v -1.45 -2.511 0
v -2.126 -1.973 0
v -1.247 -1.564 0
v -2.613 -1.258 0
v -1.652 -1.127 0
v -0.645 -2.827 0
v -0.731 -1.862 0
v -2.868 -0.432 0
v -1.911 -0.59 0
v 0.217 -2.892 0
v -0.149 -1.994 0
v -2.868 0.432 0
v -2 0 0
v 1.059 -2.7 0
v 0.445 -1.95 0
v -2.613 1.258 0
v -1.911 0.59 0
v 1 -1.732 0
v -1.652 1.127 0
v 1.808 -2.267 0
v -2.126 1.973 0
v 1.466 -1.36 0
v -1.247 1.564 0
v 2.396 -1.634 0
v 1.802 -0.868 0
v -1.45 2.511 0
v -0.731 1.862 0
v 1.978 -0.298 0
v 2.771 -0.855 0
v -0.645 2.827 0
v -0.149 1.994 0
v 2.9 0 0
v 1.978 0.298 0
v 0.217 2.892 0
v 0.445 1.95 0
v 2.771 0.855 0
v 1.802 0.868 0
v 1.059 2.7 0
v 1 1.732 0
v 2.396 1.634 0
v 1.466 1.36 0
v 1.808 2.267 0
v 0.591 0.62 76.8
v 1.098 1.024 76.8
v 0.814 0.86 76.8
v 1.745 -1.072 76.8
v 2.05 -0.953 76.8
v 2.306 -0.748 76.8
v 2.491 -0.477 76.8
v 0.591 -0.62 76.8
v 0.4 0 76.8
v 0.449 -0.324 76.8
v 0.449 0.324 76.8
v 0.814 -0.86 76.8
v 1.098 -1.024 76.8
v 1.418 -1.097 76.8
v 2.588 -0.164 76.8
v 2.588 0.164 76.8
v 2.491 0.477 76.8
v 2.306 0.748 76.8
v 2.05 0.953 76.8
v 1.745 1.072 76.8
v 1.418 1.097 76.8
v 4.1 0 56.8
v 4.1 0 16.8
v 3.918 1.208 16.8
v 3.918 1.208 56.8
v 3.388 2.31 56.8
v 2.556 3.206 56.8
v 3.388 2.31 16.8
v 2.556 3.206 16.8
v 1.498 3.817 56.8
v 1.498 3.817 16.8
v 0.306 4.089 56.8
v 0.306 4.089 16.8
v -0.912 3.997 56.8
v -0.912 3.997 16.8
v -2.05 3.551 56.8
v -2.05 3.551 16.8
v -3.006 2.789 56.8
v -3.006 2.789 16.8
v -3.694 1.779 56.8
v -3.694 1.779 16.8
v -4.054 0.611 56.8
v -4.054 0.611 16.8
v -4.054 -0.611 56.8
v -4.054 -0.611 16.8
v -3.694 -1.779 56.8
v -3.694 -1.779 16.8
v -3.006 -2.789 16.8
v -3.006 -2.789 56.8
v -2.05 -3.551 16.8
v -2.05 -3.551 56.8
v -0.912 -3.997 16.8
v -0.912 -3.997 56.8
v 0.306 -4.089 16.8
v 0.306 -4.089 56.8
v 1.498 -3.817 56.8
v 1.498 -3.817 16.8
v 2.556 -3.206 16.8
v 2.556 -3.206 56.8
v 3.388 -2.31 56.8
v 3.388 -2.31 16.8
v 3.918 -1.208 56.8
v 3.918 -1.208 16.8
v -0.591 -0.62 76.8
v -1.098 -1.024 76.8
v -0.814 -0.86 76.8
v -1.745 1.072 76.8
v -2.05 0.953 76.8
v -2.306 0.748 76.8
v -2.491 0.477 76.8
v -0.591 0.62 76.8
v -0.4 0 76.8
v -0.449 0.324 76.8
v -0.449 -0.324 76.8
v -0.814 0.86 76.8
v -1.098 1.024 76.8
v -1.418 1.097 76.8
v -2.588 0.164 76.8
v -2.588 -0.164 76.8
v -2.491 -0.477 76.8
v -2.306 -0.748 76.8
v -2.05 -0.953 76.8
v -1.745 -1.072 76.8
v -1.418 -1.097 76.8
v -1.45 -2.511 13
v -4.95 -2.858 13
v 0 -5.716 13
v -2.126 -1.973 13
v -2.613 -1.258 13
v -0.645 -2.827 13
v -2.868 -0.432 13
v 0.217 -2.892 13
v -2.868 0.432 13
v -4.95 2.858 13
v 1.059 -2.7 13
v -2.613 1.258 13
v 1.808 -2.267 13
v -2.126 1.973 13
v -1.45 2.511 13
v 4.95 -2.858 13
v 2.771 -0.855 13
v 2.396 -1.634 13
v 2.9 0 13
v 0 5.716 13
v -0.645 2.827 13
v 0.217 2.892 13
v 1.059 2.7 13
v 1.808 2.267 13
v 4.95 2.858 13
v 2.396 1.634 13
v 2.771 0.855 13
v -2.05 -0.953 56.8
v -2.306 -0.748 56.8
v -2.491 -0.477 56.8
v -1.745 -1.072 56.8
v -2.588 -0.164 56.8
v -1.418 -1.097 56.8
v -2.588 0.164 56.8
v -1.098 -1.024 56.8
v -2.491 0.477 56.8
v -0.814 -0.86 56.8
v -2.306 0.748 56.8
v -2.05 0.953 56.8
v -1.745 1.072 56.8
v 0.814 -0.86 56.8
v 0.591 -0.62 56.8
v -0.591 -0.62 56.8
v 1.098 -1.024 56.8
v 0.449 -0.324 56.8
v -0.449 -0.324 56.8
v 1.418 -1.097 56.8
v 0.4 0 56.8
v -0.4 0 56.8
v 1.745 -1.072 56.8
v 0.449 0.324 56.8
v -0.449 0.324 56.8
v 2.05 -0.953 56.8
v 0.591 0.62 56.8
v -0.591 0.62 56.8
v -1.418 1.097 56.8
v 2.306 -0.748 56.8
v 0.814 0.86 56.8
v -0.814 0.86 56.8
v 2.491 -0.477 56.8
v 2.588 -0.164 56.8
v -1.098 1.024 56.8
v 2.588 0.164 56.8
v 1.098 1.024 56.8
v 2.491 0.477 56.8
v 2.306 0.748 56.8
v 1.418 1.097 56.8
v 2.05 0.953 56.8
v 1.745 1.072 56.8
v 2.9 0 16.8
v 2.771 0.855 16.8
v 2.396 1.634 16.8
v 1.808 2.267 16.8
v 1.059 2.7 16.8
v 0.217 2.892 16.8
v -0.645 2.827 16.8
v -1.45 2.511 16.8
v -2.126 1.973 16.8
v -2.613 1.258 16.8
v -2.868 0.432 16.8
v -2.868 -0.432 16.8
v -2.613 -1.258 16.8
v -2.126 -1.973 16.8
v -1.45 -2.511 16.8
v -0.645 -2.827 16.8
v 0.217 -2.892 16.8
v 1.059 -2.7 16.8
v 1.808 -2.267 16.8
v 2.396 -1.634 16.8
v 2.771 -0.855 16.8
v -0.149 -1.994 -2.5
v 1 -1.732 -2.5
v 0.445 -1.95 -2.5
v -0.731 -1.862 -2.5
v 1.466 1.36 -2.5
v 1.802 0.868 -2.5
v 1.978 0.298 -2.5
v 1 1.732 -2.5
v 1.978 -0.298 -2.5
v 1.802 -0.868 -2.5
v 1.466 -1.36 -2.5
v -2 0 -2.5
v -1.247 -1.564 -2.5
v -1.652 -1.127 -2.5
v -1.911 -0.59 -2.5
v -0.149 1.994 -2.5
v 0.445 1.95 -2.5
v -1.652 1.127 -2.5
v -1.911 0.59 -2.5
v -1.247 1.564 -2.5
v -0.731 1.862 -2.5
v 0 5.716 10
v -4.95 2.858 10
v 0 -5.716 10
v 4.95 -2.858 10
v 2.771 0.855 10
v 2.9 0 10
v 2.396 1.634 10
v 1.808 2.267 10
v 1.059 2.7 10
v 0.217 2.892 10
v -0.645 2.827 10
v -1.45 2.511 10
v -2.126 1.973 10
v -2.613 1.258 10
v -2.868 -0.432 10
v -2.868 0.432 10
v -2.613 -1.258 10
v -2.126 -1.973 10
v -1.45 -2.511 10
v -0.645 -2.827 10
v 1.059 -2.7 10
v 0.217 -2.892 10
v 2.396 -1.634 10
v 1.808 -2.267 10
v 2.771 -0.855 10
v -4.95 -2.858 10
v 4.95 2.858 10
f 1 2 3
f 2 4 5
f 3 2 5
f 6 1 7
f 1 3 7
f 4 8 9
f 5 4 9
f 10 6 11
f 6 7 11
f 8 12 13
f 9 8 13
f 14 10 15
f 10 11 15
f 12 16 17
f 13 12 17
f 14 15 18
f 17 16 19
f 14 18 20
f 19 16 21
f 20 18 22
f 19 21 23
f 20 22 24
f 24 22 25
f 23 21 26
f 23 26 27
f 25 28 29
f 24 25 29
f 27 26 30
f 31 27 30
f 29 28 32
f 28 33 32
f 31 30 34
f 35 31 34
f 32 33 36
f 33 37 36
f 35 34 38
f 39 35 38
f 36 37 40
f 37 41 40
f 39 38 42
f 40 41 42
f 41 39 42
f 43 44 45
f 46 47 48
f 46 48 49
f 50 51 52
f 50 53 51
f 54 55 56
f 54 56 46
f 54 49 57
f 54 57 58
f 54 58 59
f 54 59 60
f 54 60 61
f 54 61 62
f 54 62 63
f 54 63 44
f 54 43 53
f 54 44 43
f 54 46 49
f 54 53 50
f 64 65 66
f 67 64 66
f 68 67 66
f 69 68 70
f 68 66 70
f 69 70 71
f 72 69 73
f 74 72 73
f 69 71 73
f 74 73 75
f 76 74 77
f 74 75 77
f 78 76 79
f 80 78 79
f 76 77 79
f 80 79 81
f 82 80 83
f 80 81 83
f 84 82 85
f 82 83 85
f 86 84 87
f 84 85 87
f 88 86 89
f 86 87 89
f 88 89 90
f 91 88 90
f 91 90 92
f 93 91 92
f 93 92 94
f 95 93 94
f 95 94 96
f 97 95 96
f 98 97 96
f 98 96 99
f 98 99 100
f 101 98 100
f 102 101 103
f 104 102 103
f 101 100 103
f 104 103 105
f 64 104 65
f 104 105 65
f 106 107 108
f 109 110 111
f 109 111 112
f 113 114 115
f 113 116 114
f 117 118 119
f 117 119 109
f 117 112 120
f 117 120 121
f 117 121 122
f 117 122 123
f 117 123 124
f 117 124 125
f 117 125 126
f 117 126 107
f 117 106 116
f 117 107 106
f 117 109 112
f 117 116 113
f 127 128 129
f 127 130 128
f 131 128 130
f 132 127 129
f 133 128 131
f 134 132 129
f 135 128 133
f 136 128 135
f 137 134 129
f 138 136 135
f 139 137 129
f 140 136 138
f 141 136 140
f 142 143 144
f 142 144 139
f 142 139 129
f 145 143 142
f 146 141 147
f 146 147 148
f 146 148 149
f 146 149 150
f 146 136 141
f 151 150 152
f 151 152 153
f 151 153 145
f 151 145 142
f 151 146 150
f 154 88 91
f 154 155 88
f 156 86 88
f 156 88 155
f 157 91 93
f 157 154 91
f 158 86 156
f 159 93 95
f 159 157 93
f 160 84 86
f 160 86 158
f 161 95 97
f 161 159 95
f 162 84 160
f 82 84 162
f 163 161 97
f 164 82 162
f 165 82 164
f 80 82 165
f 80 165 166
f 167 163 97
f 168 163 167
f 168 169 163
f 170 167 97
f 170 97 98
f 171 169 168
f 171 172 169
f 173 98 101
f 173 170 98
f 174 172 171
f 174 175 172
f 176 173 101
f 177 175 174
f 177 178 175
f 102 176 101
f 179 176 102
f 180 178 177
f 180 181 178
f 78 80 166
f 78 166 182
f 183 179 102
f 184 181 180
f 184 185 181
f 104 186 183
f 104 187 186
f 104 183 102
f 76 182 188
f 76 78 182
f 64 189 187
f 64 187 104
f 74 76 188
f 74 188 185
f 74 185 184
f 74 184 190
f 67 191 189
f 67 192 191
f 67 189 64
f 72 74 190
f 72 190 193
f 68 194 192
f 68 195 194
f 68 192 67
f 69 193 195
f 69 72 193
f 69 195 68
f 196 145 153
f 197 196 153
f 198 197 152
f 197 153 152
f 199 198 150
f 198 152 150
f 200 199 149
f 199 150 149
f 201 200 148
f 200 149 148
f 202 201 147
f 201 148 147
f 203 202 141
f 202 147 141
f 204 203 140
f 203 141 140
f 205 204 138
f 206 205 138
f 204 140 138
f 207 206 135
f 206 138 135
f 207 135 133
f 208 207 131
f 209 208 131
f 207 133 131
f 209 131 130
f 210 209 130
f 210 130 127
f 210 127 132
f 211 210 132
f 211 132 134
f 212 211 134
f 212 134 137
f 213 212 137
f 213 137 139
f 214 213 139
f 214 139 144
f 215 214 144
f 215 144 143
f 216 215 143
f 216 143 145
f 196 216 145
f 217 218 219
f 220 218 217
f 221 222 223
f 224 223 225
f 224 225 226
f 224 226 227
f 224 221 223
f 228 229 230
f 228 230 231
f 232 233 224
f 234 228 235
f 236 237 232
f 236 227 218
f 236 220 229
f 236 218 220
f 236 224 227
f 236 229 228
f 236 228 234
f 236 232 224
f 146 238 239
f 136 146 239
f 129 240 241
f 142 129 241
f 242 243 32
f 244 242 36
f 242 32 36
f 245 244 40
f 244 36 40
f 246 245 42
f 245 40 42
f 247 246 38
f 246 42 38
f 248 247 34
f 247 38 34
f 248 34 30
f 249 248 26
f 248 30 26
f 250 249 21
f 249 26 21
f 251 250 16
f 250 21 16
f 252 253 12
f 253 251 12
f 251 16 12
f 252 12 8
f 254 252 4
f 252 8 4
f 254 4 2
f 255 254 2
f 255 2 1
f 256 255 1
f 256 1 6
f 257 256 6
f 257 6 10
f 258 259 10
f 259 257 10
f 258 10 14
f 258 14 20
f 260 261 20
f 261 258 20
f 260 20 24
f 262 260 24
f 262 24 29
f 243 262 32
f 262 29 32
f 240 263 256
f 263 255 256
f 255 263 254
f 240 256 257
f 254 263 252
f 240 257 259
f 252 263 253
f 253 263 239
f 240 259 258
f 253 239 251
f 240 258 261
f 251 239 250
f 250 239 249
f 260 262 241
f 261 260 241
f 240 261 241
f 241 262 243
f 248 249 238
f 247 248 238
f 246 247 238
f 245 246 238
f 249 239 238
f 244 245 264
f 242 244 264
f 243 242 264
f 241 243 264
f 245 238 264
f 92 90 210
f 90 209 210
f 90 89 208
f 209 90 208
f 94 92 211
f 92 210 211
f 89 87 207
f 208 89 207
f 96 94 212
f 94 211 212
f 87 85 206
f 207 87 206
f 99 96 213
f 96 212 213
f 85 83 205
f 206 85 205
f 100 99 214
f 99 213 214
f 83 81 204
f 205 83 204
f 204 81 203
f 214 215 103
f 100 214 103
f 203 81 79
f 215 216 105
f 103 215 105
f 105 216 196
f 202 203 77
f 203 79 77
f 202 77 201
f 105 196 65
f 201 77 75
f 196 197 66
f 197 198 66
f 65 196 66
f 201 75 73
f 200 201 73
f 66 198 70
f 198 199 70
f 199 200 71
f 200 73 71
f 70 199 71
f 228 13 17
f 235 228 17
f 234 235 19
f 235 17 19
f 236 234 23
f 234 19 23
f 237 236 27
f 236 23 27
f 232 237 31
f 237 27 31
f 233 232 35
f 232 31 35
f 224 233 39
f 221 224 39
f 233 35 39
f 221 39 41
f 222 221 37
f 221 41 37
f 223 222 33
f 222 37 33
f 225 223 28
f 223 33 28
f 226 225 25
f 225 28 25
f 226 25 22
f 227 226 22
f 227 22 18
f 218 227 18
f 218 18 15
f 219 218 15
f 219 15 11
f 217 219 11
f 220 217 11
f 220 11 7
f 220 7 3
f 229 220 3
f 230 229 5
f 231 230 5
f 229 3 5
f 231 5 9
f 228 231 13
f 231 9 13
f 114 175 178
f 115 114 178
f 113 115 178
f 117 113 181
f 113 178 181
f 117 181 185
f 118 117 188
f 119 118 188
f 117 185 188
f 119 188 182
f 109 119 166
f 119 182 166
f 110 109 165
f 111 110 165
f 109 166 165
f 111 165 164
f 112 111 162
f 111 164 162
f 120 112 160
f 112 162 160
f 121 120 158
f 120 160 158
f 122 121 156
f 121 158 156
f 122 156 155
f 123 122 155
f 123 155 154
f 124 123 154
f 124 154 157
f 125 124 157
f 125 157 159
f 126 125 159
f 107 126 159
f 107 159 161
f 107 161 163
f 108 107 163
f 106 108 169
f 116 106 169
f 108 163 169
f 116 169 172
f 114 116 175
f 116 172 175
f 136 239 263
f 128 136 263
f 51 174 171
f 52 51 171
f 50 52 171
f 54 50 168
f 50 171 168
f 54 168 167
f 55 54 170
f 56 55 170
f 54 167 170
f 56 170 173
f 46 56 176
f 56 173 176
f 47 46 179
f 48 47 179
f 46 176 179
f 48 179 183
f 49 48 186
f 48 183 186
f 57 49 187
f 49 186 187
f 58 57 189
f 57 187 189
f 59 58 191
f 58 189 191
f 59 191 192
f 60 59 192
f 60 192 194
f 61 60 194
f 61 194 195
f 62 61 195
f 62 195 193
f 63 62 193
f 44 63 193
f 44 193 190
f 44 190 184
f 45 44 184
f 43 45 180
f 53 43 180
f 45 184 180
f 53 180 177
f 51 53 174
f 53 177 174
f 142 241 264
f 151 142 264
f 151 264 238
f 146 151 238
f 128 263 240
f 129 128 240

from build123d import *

# Parameters (mm, degrees)
ESQUISSE1_R        = 2.9
BOSS_EXTRU_1_DEPTH = 16.8
ESQUISSE2_R        = 2
BOSS_EXTRU_2_DEPTH = 2.5
ESQUISSE3_R        = 4.1
BOSS_EXTRU_3_DEPTH = 40
ESQUISSE4_R        = 1.1
BOSS_EXTRU_4_DEPTH = 20
BOSS_EXTRU_5_START = 10
BOSS_EXTRU_5_DEPTH = 3


with BuildPart() as part:
    # Esquisse1 → Boss.-Extru.1 (new body)
    with BuildSketch(Plane.XY):
        Circle(ESQUISSE1_R)
    extrude(amount=BOSS_EXTRU_1_DEPTH)

    # Esquisse2 → Boss.-Extru.2 (add)
    with BuildSketch(Plane(origin=(0, 0, 0), x_dir=(-1, 0, 0), z_dir=(0, 0, -1))):
        Circle(ESQUISSE2_R)
    extrude(amount=BOSS_EXTRU_2_DEPTH)

    # Esquisse3 → Boss.-Extru.3 (add)
    with BuildSketch(Plane.XY.offset(16.8)):
        Circle(ESQUISSE3_R)
    extrude(amount=BOSS_EXTRU_3_DEPTH)

    # Esquisse4 → Boss.-Extru.4 (add)
    with BuildSketch(Plane.XY.offset(56.8)):
        with Locations((-1.5, 0)):
            Circle(ESQUISSE4_R)
        with Locations(Location((1.5, 0, 0), (0, 0, 180))):
            Circle(ESQUISSE4_R)
    extrude(amount=BOSS_EXTRU_4_DEPTH)

    # Esquisse5 → Boss.-Extru.5 (add)
    with BuildSketch(Plane.XY.offset(BOSS_EXTRU_5_START)):
        Polygon((0, -5.715767665), (4.95, -2.857883832), (4.95, 2.857883832), (0, 5.715767665), (-4.95, 2.857883832), (-4.95, -2.857883832), align=None)
    extrude(amount=BOSS_EXTRU_5_DEPTH)


solid = part.part
